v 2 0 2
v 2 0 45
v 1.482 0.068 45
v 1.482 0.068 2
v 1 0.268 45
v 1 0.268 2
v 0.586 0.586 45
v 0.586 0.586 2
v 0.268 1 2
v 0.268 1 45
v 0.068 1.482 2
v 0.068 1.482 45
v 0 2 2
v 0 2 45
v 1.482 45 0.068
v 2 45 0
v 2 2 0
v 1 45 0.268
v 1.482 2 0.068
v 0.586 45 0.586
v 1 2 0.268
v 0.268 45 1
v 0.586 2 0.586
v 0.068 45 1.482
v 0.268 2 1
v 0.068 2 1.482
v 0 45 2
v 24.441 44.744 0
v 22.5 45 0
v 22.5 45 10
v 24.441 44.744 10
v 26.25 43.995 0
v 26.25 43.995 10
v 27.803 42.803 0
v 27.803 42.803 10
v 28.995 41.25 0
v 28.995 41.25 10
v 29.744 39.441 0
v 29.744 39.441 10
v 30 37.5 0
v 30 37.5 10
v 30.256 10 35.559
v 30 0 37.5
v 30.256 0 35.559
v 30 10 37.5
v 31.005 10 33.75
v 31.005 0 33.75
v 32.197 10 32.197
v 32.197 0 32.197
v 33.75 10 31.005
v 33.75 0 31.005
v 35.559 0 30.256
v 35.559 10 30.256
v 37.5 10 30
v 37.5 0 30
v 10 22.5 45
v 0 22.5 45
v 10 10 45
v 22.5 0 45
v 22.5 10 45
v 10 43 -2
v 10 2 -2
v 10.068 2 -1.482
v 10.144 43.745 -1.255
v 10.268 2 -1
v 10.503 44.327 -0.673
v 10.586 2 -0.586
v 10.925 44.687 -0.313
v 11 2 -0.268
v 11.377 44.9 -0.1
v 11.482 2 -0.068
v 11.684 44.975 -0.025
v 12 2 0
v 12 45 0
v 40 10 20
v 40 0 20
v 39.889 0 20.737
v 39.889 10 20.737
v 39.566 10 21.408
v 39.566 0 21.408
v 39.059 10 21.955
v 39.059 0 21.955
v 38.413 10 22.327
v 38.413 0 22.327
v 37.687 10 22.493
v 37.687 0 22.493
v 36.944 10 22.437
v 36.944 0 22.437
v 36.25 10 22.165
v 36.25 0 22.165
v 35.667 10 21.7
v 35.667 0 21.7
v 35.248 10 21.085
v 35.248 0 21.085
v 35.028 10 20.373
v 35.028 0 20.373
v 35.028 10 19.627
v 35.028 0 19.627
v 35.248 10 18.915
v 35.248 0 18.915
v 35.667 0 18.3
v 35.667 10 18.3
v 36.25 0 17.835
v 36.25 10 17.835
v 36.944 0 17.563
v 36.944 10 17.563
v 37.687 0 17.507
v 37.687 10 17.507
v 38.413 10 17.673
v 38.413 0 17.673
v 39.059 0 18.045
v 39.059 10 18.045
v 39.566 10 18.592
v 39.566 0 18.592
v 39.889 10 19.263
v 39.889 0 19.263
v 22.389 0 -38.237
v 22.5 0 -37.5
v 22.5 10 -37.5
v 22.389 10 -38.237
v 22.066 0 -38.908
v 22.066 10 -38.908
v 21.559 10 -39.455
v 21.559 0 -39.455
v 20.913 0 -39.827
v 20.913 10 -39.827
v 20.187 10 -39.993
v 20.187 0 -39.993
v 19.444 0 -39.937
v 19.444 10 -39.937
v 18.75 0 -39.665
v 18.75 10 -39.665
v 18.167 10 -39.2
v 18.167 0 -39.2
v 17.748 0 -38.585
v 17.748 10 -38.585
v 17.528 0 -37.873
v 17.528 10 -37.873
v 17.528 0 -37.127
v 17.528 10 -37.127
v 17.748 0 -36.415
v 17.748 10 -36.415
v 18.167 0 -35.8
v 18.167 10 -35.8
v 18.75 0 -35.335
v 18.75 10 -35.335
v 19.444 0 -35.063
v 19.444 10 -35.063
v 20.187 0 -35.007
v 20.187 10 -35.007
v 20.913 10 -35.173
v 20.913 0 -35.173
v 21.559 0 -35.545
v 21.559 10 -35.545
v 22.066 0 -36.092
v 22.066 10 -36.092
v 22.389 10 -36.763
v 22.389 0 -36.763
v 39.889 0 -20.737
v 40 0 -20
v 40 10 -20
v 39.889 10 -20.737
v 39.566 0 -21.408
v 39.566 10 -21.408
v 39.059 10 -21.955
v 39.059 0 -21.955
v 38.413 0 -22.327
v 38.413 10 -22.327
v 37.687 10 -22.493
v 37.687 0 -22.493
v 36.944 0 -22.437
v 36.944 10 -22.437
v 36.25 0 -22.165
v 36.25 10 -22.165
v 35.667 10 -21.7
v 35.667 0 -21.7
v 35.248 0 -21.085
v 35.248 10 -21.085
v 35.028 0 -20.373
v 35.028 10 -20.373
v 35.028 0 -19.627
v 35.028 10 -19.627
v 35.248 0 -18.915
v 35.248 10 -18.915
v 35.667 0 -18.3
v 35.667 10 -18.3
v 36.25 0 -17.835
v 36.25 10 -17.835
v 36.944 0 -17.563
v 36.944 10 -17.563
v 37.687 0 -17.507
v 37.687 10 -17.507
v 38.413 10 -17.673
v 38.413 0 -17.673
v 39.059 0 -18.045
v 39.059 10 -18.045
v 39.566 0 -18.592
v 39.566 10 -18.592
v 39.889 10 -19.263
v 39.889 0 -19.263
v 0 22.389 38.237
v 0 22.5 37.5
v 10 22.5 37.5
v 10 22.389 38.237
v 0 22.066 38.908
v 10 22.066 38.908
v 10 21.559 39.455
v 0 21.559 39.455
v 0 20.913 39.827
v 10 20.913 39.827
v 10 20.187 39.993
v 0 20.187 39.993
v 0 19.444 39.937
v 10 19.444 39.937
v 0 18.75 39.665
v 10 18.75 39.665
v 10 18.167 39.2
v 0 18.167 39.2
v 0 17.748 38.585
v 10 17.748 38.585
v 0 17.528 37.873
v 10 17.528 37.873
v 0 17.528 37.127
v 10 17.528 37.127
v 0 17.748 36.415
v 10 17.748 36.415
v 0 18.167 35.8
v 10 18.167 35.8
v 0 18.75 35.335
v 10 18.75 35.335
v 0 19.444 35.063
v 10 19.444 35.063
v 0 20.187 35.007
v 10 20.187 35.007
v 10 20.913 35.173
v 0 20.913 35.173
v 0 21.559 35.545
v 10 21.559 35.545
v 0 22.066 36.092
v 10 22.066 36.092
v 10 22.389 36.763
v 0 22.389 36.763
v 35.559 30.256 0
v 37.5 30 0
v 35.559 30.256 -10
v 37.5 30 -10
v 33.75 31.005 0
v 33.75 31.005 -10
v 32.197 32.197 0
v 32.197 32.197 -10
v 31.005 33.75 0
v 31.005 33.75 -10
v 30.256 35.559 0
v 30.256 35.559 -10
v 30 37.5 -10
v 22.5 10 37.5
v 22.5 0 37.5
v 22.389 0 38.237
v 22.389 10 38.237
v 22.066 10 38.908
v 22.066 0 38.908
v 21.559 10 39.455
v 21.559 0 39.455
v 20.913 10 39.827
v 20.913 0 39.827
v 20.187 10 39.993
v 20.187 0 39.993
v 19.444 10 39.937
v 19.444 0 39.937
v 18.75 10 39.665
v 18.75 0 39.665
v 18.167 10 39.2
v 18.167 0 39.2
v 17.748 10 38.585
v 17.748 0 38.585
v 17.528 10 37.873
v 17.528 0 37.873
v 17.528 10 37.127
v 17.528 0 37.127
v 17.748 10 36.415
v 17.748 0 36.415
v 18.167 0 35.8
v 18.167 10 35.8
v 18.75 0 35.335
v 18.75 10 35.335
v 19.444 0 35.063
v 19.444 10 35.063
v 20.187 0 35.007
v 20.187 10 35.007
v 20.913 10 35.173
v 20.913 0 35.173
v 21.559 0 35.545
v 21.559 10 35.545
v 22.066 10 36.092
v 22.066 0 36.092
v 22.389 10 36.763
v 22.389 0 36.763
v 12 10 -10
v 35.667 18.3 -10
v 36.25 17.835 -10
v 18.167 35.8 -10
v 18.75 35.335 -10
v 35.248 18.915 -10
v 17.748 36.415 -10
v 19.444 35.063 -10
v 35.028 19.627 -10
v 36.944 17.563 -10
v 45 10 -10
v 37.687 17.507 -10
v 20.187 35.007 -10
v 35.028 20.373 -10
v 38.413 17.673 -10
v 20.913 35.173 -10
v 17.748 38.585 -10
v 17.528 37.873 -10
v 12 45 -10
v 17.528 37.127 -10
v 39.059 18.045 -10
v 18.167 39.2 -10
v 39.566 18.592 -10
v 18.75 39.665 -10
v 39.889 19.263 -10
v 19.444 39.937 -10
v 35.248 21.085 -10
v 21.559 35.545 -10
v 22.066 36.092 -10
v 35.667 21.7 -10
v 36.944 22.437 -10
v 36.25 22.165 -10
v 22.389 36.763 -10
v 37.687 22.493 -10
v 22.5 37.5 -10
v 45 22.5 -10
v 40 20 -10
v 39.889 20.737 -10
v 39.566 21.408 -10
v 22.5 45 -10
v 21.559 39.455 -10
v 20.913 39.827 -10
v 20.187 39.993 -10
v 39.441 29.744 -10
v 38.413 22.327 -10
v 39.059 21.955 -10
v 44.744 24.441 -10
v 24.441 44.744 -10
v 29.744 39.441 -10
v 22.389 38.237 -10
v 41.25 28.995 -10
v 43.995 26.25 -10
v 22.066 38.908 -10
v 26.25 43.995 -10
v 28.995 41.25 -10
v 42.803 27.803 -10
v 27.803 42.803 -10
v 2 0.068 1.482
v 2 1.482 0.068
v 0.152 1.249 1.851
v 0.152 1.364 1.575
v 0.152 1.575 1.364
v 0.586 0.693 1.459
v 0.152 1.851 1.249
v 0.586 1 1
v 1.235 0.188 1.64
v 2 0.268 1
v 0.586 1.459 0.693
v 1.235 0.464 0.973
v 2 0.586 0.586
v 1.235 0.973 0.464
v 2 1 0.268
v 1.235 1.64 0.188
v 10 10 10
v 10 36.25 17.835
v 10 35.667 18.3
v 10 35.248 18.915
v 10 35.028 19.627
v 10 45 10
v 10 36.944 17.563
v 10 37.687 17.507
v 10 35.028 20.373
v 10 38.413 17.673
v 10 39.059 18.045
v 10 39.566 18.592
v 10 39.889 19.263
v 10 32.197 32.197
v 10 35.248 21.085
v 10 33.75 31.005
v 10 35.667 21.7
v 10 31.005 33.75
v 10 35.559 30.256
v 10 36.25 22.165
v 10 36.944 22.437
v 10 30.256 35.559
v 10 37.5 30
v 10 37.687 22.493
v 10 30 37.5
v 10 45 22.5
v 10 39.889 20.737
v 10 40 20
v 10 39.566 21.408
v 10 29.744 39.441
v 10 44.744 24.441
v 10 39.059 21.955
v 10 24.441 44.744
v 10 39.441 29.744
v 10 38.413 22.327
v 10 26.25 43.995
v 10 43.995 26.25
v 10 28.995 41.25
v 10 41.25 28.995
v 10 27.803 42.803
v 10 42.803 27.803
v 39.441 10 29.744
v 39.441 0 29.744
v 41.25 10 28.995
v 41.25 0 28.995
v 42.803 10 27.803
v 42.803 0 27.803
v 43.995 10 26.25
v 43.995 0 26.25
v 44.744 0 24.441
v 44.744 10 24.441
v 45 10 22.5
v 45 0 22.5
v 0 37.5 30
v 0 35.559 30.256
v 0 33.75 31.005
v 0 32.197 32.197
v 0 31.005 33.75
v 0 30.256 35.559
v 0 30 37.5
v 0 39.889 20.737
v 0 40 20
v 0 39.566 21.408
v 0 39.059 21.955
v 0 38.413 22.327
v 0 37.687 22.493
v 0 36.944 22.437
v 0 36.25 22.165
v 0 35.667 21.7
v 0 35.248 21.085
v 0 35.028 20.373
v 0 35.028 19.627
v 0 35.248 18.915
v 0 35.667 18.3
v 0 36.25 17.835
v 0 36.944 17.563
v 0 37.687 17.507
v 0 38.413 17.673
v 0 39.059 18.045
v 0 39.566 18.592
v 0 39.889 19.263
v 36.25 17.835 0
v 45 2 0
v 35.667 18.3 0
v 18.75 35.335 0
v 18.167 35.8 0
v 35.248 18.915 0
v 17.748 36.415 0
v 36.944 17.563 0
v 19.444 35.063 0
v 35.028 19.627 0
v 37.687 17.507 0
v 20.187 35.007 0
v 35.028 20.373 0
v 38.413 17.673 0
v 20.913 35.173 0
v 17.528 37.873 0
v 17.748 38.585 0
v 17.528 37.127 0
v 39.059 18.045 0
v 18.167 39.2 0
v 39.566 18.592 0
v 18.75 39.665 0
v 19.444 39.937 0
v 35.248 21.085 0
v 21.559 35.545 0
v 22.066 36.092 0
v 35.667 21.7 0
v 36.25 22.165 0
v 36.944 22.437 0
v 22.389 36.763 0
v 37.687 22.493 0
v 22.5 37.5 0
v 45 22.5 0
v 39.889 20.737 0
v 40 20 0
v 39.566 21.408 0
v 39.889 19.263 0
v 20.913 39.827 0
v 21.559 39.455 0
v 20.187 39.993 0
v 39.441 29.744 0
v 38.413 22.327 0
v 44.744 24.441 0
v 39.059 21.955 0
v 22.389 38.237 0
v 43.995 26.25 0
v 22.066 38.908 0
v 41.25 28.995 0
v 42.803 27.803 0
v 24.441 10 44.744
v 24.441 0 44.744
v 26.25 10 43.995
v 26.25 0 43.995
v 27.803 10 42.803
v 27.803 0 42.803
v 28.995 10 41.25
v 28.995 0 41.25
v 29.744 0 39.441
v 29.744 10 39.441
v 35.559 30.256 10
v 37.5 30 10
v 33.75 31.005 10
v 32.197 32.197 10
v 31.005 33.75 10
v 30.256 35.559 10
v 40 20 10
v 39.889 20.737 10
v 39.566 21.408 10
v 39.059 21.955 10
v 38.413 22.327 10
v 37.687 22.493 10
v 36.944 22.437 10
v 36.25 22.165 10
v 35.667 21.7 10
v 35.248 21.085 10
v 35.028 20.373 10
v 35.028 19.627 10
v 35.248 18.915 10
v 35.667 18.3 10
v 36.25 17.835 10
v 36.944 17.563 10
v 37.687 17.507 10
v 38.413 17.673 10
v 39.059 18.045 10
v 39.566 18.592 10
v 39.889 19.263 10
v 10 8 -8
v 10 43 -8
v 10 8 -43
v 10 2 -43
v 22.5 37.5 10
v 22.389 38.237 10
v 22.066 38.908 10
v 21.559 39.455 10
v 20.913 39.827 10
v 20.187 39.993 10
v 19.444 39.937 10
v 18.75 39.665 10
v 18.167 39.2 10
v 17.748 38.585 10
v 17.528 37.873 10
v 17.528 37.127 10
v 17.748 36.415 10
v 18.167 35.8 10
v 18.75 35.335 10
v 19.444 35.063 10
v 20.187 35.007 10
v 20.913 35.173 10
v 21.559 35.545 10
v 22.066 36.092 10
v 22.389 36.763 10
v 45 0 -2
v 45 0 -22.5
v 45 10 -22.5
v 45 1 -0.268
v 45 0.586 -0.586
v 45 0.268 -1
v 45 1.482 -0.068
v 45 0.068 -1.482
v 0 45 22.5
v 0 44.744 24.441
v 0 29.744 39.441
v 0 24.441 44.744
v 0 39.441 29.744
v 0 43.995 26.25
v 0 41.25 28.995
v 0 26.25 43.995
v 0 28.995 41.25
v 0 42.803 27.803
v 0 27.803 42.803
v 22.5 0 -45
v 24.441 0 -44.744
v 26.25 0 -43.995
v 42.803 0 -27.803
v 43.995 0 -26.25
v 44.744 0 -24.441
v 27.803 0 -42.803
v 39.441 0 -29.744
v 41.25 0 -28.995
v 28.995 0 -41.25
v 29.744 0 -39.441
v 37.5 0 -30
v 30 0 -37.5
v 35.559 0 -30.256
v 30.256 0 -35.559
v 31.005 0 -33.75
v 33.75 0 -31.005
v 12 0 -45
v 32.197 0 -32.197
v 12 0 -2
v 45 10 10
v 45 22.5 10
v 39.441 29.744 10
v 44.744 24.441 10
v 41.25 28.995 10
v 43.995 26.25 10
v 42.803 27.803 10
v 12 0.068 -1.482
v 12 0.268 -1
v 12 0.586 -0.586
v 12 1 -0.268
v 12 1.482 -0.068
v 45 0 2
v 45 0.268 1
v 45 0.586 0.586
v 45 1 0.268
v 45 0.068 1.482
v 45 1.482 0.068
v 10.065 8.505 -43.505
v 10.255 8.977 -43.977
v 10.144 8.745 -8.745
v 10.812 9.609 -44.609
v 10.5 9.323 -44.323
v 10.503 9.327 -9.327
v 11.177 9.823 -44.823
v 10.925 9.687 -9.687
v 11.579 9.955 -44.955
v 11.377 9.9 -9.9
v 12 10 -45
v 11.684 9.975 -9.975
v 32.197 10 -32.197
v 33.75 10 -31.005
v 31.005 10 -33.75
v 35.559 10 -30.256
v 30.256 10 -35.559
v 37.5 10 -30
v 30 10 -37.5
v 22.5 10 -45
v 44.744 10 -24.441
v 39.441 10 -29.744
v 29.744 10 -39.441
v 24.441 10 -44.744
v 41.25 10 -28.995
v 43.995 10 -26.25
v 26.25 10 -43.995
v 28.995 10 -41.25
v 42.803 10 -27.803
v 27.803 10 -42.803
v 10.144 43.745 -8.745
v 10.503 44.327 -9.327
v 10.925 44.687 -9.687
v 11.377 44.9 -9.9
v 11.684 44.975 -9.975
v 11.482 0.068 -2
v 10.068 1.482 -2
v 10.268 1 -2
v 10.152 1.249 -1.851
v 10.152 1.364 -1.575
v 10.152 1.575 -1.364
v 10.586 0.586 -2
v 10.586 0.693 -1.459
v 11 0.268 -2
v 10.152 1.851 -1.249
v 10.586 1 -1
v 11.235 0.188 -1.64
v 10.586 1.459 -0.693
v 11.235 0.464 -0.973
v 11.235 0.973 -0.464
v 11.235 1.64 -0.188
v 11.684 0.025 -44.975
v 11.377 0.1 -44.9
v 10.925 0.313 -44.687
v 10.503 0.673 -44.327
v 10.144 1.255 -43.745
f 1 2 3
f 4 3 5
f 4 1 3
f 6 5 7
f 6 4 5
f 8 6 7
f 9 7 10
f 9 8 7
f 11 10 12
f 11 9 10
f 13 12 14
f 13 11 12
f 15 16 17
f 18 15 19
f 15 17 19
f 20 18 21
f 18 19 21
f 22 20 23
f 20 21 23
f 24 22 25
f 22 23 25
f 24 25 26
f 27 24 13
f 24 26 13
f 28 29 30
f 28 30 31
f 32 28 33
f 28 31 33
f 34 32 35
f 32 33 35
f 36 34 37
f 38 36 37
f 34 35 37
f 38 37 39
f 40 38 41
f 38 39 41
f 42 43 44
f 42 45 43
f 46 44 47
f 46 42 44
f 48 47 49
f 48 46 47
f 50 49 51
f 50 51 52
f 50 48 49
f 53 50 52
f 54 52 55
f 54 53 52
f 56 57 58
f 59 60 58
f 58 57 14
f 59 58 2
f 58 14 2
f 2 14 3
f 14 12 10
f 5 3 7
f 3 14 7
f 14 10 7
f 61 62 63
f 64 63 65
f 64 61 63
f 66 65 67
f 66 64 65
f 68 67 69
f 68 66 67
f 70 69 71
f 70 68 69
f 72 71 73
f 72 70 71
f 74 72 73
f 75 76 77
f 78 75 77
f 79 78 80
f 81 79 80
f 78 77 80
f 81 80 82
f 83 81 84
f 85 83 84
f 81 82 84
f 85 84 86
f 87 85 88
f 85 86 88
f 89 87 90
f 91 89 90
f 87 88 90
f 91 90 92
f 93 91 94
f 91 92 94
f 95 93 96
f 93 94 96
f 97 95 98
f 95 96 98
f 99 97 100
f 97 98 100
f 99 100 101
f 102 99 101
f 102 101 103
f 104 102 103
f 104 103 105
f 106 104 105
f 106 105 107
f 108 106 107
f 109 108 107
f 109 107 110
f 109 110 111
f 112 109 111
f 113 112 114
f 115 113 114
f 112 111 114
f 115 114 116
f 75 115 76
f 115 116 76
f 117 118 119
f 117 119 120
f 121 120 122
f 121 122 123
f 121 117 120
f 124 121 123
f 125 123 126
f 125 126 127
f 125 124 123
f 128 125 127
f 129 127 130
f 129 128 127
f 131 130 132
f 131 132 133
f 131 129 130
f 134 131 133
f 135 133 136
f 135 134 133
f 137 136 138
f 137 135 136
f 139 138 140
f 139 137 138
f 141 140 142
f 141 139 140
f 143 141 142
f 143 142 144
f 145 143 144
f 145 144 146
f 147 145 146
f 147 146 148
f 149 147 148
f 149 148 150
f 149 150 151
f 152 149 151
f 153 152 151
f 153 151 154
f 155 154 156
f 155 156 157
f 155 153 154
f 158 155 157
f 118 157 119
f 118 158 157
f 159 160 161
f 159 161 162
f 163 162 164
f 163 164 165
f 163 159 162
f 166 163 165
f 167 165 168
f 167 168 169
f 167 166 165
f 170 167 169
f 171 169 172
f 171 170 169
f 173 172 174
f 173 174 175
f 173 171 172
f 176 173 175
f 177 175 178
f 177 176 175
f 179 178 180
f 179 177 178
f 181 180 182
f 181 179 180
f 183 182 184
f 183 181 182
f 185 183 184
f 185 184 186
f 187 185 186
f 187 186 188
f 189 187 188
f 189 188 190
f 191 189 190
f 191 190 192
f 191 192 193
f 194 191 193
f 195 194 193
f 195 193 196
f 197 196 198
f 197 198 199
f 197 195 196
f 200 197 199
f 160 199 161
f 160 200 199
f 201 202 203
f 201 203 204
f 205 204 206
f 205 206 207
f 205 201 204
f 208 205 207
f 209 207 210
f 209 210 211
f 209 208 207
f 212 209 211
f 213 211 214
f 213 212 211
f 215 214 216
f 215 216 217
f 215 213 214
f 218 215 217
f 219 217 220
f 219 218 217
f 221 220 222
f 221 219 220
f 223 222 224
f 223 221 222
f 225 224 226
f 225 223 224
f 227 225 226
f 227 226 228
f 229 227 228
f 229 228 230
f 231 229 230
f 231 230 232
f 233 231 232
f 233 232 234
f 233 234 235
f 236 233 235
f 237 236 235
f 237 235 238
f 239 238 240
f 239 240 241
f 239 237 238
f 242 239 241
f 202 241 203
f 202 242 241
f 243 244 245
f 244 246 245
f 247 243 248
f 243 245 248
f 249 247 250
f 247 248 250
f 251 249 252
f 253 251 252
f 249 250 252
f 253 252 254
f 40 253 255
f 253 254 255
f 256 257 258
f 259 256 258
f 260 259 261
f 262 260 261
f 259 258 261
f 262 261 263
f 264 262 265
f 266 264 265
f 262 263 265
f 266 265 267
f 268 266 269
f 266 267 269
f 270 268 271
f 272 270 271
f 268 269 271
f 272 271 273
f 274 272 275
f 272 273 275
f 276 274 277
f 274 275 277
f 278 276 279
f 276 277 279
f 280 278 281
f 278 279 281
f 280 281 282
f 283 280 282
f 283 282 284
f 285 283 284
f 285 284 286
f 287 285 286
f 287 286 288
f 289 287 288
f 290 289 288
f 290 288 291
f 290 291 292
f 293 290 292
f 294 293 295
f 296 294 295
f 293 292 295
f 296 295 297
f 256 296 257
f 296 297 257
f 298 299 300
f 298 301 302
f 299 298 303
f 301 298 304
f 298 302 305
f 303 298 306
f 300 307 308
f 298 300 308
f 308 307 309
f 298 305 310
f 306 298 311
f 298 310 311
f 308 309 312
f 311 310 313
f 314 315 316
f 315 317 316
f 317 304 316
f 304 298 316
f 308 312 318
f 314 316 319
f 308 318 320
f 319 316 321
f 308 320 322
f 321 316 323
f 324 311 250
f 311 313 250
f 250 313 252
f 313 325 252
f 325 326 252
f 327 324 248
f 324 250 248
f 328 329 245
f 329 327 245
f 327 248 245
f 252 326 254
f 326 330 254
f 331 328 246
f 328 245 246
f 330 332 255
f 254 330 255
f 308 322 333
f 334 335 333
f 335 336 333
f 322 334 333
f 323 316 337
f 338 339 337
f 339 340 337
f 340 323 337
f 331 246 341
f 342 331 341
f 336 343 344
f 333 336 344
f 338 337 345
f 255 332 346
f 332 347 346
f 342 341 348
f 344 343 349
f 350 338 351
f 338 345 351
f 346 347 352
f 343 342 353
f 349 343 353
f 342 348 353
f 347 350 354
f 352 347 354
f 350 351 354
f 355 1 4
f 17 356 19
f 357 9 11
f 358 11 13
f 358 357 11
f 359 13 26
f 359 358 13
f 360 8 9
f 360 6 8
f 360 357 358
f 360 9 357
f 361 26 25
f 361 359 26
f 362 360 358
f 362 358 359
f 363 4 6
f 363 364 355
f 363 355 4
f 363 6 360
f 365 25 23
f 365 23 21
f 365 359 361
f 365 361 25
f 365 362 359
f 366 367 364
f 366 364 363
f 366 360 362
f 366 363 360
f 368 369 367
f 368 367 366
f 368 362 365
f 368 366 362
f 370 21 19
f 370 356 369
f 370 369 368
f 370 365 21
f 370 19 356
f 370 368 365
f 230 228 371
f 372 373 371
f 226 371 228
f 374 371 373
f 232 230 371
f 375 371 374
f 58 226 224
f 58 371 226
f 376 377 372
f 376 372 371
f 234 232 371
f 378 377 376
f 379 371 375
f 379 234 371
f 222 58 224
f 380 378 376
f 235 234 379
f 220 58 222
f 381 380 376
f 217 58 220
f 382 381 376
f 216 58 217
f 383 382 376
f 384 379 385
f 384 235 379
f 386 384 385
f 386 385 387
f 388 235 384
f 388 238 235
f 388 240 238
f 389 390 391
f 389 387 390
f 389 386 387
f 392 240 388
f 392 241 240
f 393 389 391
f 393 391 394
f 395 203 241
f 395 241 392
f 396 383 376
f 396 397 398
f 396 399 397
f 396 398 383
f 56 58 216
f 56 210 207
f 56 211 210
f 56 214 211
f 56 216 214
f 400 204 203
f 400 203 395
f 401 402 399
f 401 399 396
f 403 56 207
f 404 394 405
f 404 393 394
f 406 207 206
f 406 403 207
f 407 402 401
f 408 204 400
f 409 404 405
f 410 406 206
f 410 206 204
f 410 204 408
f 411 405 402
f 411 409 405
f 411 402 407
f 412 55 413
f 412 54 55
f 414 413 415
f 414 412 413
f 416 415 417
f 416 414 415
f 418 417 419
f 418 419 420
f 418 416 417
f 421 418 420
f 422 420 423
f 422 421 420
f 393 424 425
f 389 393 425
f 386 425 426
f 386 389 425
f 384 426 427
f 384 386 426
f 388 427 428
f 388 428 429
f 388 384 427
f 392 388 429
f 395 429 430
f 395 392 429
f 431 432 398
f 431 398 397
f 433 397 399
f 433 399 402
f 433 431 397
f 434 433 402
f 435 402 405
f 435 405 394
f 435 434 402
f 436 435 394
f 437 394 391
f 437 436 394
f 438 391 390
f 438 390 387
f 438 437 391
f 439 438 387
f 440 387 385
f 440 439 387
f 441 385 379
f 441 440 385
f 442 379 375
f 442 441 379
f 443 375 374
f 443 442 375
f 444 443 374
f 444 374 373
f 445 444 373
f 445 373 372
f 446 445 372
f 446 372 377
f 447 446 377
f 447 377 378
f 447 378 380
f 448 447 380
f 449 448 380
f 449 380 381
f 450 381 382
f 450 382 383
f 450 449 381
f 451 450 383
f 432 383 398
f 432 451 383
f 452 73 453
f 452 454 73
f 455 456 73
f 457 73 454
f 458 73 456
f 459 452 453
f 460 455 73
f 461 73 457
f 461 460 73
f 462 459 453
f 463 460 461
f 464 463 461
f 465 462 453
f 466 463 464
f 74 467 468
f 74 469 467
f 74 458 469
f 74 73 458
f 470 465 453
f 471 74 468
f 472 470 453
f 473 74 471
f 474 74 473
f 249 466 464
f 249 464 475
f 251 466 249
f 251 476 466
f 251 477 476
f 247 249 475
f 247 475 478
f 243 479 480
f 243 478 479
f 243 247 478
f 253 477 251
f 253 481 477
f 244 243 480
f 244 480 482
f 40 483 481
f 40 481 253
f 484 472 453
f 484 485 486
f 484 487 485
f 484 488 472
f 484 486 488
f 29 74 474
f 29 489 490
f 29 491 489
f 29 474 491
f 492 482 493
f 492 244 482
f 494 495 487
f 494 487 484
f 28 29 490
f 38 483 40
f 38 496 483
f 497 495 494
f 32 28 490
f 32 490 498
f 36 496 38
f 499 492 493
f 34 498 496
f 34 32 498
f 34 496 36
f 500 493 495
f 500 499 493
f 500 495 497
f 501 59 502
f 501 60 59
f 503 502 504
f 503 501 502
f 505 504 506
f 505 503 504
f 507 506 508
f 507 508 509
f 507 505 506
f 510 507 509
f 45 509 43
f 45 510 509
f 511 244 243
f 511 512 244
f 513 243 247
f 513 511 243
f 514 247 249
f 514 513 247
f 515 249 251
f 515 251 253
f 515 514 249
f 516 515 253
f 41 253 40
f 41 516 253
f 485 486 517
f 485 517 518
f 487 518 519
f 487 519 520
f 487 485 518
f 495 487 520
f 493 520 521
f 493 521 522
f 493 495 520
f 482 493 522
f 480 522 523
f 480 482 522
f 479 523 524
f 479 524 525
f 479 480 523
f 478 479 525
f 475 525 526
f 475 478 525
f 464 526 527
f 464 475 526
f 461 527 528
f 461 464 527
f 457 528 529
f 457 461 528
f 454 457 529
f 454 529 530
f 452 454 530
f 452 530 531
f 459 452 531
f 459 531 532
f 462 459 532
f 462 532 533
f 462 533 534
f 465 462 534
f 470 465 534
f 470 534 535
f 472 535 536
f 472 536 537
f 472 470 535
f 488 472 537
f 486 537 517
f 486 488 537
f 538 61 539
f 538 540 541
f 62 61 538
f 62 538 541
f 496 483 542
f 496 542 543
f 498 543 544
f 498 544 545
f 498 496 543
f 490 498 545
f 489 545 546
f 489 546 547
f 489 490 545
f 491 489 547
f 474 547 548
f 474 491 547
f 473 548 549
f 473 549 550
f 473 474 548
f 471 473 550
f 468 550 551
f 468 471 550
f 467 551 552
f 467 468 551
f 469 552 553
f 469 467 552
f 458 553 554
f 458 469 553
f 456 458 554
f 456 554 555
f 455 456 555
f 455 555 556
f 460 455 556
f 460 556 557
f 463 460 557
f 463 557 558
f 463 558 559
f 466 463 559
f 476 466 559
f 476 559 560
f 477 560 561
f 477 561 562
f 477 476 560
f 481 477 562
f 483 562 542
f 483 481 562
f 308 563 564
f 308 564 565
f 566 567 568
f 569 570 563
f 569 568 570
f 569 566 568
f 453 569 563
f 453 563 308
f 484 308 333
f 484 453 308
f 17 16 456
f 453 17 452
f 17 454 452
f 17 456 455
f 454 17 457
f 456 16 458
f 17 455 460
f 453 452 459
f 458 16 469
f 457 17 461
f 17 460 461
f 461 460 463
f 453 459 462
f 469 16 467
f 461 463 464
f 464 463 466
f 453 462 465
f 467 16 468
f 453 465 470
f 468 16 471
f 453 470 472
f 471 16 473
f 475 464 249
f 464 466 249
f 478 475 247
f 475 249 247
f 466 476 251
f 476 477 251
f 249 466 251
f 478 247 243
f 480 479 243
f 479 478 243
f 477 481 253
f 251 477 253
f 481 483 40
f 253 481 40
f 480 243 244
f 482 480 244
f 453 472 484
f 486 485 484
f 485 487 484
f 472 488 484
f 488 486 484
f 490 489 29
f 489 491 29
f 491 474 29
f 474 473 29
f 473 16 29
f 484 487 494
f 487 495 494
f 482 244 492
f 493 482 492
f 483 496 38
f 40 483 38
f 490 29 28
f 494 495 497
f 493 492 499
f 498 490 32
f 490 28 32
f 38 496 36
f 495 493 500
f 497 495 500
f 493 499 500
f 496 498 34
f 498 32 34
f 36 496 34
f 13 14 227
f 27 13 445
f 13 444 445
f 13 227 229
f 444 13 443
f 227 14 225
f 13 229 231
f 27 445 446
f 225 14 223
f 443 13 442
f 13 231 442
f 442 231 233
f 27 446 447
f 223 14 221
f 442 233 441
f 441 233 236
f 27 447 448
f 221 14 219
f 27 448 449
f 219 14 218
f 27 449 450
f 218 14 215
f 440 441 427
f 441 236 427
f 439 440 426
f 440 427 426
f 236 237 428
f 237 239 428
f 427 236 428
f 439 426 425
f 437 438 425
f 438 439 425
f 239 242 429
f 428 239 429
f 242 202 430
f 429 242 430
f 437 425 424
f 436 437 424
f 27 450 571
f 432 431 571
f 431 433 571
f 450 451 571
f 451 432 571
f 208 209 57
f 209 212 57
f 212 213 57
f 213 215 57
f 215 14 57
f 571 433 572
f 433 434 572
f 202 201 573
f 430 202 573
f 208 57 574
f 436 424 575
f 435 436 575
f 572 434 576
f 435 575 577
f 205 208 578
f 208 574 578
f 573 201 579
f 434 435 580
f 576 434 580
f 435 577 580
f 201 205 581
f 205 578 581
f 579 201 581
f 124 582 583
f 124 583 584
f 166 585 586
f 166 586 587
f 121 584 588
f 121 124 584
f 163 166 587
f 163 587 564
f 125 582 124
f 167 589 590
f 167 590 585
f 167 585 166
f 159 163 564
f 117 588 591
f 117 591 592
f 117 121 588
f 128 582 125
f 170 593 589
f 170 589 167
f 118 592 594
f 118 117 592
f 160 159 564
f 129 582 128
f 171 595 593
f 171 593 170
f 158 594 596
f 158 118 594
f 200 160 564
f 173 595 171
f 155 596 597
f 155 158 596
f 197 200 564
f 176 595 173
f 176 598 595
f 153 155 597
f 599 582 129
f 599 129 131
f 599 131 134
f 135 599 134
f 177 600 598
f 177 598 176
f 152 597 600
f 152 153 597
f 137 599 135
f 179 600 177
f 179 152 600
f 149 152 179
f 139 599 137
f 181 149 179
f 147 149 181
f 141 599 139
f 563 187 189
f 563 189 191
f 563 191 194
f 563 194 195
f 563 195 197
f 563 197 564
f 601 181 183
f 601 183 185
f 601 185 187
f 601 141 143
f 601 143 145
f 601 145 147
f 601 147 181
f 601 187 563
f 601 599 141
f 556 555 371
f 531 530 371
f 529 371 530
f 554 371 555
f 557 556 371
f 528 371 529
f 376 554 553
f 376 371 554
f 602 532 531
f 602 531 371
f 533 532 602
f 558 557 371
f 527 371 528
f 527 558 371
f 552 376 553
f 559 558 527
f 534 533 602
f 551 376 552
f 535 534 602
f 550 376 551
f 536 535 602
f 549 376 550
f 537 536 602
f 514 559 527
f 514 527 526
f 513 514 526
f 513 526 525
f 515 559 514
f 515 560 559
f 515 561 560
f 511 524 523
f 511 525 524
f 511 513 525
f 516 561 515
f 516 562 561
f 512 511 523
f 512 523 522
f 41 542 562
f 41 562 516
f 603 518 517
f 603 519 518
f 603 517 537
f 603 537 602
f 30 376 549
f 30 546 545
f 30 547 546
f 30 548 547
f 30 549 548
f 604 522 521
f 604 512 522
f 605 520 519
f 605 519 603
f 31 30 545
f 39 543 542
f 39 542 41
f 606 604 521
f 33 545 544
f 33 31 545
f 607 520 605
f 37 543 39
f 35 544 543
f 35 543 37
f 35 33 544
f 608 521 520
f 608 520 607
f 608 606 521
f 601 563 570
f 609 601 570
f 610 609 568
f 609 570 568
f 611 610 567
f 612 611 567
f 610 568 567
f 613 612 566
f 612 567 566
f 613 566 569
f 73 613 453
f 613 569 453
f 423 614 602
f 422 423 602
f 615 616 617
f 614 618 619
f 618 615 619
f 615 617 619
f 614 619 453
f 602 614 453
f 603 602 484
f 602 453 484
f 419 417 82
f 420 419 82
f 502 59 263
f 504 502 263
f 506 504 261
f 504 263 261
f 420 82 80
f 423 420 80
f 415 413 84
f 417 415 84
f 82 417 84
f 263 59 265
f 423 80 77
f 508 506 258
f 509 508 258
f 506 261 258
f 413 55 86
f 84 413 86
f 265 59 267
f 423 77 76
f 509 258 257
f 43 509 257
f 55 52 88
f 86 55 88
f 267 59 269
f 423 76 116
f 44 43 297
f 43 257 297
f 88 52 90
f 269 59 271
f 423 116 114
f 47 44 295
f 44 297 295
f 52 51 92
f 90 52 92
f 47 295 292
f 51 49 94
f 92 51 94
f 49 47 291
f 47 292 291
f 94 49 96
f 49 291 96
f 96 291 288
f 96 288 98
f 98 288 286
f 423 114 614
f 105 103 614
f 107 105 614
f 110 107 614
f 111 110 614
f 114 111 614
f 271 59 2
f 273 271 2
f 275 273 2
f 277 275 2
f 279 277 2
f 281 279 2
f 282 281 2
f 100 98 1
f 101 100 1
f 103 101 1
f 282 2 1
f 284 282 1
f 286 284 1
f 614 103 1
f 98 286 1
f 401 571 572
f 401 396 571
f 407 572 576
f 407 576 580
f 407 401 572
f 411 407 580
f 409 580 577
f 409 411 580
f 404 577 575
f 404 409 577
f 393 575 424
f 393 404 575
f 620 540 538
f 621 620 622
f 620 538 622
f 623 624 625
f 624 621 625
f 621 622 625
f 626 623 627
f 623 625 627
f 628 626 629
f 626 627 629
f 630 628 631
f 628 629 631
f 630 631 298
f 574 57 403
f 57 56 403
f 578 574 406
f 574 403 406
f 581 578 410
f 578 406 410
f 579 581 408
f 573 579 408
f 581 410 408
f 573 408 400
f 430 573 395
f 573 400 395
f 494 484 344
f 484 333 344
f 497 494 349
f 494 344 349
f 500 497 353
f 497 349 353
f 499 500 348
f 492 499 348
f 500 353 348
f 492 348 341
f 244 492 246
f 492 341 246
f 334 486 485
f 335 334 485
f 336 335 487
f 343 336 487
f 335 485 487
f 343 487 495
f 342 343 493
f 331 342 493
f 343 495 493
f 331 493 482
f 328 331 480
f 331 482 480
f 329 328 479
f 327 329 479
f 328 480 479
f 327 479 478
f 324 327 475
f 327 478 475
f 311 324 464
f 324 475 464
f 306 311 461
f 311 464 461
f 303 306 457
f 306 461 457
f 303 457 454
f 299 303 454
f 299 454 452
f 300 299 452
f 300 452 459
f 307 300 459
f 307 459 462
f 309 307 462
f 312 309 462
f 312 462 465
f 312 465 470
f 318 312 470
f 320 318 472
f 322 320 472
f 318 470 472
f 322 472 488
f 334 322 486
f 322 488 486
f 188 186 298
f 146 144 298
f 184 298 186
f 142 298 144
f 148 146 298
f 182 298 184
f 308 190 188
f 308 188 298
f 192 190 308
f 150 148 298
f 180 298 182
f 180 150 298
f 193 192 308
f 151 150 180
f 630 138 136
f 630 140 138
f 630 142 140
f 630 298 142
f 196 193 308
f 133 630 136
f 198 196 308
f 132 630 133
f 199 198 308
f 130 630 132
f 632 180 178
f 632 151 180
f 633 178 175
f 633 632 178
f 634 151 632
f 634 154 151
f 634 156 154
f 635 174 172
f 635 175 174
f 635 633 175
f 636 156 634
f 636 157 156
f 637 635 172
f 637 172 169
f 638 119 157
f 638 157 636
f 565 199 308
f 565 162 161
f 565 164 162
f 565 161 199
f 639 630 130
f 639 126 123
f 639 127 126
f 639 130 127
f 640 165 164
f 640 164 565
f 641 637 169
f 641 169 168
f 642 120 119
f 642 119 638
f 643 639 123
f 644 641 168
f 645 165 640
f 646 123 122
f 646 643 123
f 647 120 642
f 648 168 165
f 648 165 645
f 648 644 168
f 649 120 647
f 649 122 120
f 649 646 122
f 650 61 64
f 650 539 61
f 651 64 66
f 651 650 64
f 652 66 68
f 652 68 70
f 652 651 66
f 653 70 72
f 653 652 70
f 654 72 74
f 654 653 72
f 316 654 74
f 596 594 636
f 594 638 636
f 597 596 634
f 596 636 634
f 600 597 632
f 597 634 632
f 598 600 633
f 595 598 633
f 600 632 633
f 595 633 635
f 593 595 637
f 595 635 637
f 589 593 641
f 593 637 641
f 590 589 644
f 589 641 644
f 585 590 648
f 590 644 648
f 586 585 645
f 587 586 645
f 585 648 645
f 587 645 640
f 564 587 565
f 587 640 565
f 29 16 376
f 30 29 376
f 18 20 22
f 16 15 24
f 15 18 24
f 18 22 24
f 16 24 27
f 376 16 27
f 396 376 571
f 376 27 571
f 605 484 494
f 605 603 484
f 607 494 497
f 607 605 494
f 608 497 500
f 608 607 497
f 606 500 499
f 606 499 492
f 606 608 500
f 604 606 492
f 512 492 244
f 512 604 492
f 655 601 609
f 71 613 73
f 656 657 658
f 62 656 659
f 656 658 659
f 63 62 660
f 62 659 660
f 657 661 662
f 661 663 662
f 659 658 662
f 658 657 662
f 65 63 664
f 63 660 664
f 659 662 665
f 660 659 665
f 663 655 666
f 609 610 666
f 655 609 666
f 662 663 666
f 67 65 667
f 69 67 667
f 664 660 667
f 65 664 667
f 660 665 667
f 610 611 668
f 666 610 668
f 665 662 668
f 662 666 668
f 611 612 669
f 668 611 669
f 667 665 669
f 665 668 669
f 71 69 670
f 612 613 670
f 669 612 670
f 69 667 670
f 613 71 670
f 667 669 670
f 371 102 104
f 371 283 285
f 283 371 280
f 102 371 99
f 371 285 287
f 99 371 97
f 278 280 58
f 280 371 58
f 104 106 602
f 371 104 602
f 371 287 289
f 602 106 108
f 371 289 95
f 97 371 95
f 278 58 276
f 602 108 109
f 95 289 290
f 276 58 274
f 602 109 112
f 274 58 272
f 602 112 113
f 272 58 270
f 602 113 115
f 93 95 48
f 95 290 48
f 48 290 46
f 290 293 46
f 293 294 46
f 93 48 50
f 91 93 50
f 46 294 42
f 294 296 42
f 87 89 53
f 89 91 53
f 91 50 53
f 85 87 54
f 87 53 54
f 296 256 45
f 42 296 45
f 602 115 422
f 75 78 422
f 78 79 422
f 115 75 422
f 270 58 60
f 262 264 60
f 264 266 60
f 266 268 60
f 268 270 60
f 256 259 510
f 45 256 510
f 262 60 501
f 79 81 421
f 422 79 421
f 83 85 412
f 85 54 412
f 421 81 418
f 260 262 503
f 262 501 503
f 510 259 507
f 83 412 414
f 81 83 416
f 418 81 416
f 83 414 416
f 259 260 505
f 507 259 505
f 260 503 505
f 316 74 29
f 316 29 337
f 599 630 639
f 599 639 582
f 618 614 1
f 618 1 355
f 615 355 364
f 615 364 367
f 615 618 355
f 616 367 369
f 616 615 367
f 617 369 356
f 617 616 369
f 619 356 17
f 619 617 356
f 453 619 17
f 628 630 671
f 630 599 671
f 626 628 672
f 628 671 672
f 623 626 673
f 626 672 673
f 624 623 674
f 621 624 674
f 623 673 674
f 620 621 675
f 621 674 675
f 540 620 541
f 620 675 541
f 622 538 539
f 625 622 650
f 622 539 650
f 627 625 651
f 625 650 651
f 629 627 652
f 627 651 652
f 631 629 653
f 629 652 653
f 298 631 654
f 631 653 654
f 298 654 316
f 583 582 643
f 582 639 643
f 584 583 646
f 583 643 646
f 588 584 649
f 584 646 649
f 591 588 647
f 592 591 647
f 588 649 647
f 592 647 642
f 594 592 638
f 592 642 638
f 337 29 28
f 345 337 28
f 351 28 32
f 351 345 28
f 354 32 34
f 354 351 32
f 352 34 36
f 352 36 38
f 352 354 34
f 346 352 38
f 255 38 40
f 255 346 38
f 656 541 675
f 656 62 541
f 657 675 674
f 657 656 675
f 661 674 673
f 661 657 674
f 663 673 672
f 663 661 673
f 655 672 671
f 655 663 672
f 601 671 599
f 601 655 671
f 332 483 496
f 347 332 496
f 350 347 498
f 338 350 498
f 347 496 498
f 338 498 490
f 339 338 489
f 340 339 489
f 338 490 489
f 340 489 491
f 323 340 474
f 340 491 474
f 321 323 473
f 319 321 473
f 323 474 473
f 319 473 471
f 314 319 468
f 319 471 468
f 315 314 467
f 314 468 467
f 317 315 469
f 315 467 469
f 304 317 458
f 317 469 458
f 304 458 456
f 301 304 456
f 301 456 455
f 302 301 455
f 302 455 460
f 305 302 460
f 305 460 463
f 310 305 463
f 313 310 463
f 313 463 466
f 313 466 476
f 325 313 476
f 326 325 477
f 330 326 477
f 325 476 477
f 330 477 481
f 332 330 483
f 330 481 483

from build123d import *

# Parameters (mm, degrees)
F0_R      = 2.5
F1_DEPTH  = 10
F2_R      = 2.5
F3_DEPTH  = 10
F4_R      = 2.5
F5_DEPTH  = 10
F6_R      = 2
F7_R      = 7.5
F8_R      = 7.49999
F10_R     = 2.5
F11_DEPTH = 10
F12_R     = 2


# Not quite as in the source:
# - a fillet or chamfer is up to 0.001 mm smaller than in the source, because OpenCascade refuses the exact size
# - a feature names something its author has since deleted; it is built from what else it names


with BuildPart() as f1:
    # F0 (on Top) → F1 (new body)
    with BuildSketch(Plane.XY):
        Polygon((10, 10), (10, 45), (0, 45), (0, 0), (45, 0), (45, 10), align=None)
        Polygon((30, 45), (10, 45), (10, 10), (45, 10), (45, 30), (30, 30), align=None)
        with Locations((37.5, 20)):
            Circle(F0_R, mode=Mode.SUBTRACT)
        with Locations((20, 37.5)):
            Circle(F0_R, mode=Mode.SUBTRACT)
    extrude(amount=F1_DEPTH)

    # F2 (on Right) → F3 (join)
    with BuildSketch(Plane.YZ):
        Polygon((10, 10), (10, 45), (0, 45), (0, 0), (45, 0), (45, 10), align=None)
        Polygon((30, 45), (10, 45), (10, 10), (45, 10), (45, 30), (30, 30), align=None)
        with Locations((37.5, 20)):
            Circle(F2_R, mode=Mode.SUBTRACT)
        with Locations((20, 37.5)):
            Circle(F2_R, mode=Mode.SUBTRACT)
    extrude(amount=F3_DEPTH)

    # F4 (on Front) → F5 (join)
    with BuildSketch(Plane.XZ):
        Polygon((10, 10), (10, 45), (0, 45), (0, 0), (45, 0), (45, 10), align=None)
        Polygon((30, 45), (10, 45), (10, 10), (45, 10), (45, 30), (30, 30), align=None)
        with Locations((37.5, 20)):
            Circle(F4_R, mode=Mode.SUBTRACT)
        with Locations((20, 37.5)):
            Circle(F4_R, mode=Mode.SUBTRACT)
    extrude(amount=-F5_DEPTH)

    # F6
    f6_edges = [f1.edges().sort_by_distance(p)[0] for p in [
        (22.5, 0, 0),
        (0, 0, 22.5),
        (0, 22.5, 0),
    ]]
    fillet(f6_edges, radius=F6_R)

    # F7
    f7_edges = [f1.edges().sort_by_distance(p)[0] for p in [
        (45, 5, 30),
        (30, 5, 45),
        (5, 30, 45),
        (5, 45, 30),
        (30, 45, 5),
        (45, 30, 5),
    ]]
    fillet(f7_edges, radius=F7_R)

    # F8 (radius 7.5 in the source; OpenCascade refuses exactly that, so slightly less here)
    f8_edges = [f1.edges().sort_by_distance(p)[0] for p in [
        (30, 5, 30),
        (30, 30, 5),
        (5, 30, 30),
    ]]
    fillet(f8_edges, radius=F8_R)


with BuildPart() as f9_1:
    # F9: instance of F1
    add(f1.part.mirror(Plane.XY))

    # F10 (on face) → F11 (cut, through all)
    with BuildSketch(Plane(origin=(0, 0, 0), x_dir=(0, -1, 0), z_dir=(-1, 0, 0))):
        with BuildLine():
            Line((-45, -2), (-45, -22.5))
            ThreePointArc((-45, -22.5), (-42.8033008589, -27.8033008589), (-37.5, -30))
            ThreePointArc((-37.5, -30), (-32.1966991411, -32.1966991411), (-30, -37.5))
            ThreePointArc((-30, -37.5), (-27.8033008589, -42.8033008589), (-22.5, -45))
            Line((-22.5, -45), (-2, -45))
            Line((-2, -45), (-2, -2))
            Line((-2, -2), (-45, -2))
        make_face()
        with Locations((-20, -37.5)):
            Circle(F10_R, mode=Mode.SUBTRACT)
        with Locations((-37.5, -20)):
            Circle(F10_R, mode=Mode.SUBTRACT)
        with BuildLine():
            Line((-45, 0), (-45, -2))
            Line((-45, -2), (-2, -2))
            Line((-2, -2), (-2, -45))
            Line((-2, -45), (0, -45))
            Line((0, -45), (0, -37.5))
            Line((0, -37.5), (0, -30))
            Line((0, -30), (0, -22.5))
            Line((0, -22.5), (0, -2))
            ThreePointArc((0, -2), (-0.5857864376, -0.5857864376), (-2, 0))
            Line((-2, 0), (-45, 0))
        make_face()
    extrude(amount=-F11_DEPTH, mode=Mode.SUBTRACT)

    # F12
    f12_edges = [f9_1.edges().sort_by_distance(p)[0] for p in [
        (10, 45, -5),
        (10, 23.5, 0),
        (10, 0.585786, -0.585786),
        (10, 0, -23.5),
        (10, 5, -45),
        (10, 10, -27.5),
        (10, 27.5, -10),
    ]]
    fillet(f12_edges, radius=F12_R)


solid = Compound([f1.part, f9_1.part])
